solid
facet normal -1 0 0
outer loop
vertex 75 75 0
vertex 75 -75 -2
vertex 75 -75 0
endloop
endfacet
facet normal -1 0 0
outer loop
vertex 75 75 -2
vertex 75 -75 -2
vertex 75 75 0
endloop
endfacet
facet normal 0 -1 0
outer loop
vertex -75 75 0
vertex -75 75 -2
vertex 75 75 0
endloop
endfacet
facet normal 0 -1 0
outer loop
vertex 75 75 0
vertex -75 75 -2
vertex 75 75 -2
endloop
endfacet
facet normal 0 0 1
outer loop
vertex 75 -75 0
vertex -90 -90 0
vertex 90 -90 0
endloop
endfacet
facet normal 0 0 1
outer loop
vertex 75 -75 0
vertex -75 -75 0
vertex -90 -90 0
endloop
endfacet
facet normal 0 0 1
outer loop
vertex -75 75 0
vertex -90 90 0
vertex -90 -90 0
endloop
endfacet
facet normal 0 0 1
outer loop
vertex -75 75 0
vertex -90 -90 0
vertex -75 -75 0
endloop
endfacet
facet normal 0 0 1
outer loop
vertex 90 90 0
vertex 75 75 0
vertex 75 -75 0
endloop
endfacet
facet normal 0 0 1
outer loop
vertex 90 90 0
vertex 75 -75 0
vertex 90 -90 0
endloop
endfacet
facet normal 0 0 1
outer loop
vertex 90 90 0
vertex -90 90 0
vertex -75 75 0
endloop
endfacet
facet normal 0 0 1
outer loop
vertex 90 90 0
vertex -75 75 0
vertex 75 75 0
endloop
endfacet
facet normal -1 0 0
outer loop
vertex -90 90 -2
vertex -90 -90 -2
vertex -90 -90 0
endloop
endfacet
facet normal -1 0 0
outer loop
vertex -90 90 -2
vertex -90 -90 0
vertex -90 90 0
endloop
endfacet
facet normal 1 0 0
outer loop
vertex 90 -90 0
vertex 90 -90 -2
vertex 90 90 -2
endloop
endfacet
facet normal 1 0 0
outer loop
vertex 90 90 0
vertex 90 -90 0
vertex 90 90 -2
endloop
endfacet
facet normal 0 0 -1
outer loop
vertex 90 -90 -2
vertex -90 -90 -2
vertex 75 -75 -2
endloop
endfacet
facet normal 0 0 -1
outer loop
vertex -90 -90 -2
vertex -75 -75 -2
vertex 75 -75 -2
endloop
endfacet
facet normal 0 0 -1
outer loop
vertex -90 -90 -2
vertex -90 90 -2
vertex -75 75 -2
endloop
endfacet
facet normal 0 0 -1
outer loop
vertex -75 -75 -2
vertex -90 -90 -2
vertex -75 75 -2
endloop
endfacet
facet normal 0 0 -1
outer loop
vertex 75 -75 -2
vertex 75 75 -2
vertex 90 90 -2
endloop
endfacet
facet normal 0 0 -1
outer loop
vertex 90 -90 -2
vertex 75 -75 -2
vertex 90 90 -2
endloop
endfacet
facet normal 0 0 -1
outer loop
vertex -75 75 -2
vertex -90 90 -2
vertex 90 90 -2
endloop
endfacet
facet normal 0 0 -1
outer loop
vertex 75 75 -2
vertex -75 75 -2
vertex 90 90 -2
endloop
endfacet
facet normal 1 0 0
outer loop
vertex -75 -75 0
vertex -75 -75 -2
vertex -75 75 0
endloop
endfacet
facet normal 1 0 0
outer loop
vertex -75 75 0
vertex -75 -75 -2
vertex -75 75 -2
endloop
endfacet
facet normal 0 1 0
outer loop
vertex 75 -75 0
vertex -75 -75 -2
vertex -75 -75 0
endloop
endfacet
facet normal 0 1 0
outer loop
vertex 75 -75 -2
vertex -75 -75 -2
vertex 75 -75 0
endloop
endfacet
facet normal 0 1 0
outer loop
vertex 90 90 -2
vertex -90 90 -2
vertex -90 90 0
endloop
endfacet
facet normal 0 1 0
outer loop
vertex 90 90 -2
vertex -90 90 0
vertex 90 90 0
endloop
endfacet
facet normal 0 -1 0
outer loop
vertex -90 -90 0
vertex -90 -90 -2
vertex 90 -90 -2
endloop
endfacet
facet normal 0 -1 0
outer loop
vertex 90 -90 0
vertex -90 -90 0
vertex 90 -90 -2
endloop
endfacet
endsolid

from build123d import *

# Parameters (mm, degrees)
SKETCH_W   = 180
SKETCH_H   = 180
SKETCH_W_2 = 150
SKETCH_H_2 = 150
PAD_DEPTH  = 2


with BuildPart() as part:
    # Sketch (on DatumPlane) → Pad (new body)
    with BuildSketch(Plane.XY.offset(-2)):
        Rectangle(SKETCH_W, SKETCH_H)
        Rectangle(SKETCH_W_2, SKETCH_H_2, mode=Mode.SUBTRACT)
    extrude(amount=PAD_DEPTH)


solid = part.part
